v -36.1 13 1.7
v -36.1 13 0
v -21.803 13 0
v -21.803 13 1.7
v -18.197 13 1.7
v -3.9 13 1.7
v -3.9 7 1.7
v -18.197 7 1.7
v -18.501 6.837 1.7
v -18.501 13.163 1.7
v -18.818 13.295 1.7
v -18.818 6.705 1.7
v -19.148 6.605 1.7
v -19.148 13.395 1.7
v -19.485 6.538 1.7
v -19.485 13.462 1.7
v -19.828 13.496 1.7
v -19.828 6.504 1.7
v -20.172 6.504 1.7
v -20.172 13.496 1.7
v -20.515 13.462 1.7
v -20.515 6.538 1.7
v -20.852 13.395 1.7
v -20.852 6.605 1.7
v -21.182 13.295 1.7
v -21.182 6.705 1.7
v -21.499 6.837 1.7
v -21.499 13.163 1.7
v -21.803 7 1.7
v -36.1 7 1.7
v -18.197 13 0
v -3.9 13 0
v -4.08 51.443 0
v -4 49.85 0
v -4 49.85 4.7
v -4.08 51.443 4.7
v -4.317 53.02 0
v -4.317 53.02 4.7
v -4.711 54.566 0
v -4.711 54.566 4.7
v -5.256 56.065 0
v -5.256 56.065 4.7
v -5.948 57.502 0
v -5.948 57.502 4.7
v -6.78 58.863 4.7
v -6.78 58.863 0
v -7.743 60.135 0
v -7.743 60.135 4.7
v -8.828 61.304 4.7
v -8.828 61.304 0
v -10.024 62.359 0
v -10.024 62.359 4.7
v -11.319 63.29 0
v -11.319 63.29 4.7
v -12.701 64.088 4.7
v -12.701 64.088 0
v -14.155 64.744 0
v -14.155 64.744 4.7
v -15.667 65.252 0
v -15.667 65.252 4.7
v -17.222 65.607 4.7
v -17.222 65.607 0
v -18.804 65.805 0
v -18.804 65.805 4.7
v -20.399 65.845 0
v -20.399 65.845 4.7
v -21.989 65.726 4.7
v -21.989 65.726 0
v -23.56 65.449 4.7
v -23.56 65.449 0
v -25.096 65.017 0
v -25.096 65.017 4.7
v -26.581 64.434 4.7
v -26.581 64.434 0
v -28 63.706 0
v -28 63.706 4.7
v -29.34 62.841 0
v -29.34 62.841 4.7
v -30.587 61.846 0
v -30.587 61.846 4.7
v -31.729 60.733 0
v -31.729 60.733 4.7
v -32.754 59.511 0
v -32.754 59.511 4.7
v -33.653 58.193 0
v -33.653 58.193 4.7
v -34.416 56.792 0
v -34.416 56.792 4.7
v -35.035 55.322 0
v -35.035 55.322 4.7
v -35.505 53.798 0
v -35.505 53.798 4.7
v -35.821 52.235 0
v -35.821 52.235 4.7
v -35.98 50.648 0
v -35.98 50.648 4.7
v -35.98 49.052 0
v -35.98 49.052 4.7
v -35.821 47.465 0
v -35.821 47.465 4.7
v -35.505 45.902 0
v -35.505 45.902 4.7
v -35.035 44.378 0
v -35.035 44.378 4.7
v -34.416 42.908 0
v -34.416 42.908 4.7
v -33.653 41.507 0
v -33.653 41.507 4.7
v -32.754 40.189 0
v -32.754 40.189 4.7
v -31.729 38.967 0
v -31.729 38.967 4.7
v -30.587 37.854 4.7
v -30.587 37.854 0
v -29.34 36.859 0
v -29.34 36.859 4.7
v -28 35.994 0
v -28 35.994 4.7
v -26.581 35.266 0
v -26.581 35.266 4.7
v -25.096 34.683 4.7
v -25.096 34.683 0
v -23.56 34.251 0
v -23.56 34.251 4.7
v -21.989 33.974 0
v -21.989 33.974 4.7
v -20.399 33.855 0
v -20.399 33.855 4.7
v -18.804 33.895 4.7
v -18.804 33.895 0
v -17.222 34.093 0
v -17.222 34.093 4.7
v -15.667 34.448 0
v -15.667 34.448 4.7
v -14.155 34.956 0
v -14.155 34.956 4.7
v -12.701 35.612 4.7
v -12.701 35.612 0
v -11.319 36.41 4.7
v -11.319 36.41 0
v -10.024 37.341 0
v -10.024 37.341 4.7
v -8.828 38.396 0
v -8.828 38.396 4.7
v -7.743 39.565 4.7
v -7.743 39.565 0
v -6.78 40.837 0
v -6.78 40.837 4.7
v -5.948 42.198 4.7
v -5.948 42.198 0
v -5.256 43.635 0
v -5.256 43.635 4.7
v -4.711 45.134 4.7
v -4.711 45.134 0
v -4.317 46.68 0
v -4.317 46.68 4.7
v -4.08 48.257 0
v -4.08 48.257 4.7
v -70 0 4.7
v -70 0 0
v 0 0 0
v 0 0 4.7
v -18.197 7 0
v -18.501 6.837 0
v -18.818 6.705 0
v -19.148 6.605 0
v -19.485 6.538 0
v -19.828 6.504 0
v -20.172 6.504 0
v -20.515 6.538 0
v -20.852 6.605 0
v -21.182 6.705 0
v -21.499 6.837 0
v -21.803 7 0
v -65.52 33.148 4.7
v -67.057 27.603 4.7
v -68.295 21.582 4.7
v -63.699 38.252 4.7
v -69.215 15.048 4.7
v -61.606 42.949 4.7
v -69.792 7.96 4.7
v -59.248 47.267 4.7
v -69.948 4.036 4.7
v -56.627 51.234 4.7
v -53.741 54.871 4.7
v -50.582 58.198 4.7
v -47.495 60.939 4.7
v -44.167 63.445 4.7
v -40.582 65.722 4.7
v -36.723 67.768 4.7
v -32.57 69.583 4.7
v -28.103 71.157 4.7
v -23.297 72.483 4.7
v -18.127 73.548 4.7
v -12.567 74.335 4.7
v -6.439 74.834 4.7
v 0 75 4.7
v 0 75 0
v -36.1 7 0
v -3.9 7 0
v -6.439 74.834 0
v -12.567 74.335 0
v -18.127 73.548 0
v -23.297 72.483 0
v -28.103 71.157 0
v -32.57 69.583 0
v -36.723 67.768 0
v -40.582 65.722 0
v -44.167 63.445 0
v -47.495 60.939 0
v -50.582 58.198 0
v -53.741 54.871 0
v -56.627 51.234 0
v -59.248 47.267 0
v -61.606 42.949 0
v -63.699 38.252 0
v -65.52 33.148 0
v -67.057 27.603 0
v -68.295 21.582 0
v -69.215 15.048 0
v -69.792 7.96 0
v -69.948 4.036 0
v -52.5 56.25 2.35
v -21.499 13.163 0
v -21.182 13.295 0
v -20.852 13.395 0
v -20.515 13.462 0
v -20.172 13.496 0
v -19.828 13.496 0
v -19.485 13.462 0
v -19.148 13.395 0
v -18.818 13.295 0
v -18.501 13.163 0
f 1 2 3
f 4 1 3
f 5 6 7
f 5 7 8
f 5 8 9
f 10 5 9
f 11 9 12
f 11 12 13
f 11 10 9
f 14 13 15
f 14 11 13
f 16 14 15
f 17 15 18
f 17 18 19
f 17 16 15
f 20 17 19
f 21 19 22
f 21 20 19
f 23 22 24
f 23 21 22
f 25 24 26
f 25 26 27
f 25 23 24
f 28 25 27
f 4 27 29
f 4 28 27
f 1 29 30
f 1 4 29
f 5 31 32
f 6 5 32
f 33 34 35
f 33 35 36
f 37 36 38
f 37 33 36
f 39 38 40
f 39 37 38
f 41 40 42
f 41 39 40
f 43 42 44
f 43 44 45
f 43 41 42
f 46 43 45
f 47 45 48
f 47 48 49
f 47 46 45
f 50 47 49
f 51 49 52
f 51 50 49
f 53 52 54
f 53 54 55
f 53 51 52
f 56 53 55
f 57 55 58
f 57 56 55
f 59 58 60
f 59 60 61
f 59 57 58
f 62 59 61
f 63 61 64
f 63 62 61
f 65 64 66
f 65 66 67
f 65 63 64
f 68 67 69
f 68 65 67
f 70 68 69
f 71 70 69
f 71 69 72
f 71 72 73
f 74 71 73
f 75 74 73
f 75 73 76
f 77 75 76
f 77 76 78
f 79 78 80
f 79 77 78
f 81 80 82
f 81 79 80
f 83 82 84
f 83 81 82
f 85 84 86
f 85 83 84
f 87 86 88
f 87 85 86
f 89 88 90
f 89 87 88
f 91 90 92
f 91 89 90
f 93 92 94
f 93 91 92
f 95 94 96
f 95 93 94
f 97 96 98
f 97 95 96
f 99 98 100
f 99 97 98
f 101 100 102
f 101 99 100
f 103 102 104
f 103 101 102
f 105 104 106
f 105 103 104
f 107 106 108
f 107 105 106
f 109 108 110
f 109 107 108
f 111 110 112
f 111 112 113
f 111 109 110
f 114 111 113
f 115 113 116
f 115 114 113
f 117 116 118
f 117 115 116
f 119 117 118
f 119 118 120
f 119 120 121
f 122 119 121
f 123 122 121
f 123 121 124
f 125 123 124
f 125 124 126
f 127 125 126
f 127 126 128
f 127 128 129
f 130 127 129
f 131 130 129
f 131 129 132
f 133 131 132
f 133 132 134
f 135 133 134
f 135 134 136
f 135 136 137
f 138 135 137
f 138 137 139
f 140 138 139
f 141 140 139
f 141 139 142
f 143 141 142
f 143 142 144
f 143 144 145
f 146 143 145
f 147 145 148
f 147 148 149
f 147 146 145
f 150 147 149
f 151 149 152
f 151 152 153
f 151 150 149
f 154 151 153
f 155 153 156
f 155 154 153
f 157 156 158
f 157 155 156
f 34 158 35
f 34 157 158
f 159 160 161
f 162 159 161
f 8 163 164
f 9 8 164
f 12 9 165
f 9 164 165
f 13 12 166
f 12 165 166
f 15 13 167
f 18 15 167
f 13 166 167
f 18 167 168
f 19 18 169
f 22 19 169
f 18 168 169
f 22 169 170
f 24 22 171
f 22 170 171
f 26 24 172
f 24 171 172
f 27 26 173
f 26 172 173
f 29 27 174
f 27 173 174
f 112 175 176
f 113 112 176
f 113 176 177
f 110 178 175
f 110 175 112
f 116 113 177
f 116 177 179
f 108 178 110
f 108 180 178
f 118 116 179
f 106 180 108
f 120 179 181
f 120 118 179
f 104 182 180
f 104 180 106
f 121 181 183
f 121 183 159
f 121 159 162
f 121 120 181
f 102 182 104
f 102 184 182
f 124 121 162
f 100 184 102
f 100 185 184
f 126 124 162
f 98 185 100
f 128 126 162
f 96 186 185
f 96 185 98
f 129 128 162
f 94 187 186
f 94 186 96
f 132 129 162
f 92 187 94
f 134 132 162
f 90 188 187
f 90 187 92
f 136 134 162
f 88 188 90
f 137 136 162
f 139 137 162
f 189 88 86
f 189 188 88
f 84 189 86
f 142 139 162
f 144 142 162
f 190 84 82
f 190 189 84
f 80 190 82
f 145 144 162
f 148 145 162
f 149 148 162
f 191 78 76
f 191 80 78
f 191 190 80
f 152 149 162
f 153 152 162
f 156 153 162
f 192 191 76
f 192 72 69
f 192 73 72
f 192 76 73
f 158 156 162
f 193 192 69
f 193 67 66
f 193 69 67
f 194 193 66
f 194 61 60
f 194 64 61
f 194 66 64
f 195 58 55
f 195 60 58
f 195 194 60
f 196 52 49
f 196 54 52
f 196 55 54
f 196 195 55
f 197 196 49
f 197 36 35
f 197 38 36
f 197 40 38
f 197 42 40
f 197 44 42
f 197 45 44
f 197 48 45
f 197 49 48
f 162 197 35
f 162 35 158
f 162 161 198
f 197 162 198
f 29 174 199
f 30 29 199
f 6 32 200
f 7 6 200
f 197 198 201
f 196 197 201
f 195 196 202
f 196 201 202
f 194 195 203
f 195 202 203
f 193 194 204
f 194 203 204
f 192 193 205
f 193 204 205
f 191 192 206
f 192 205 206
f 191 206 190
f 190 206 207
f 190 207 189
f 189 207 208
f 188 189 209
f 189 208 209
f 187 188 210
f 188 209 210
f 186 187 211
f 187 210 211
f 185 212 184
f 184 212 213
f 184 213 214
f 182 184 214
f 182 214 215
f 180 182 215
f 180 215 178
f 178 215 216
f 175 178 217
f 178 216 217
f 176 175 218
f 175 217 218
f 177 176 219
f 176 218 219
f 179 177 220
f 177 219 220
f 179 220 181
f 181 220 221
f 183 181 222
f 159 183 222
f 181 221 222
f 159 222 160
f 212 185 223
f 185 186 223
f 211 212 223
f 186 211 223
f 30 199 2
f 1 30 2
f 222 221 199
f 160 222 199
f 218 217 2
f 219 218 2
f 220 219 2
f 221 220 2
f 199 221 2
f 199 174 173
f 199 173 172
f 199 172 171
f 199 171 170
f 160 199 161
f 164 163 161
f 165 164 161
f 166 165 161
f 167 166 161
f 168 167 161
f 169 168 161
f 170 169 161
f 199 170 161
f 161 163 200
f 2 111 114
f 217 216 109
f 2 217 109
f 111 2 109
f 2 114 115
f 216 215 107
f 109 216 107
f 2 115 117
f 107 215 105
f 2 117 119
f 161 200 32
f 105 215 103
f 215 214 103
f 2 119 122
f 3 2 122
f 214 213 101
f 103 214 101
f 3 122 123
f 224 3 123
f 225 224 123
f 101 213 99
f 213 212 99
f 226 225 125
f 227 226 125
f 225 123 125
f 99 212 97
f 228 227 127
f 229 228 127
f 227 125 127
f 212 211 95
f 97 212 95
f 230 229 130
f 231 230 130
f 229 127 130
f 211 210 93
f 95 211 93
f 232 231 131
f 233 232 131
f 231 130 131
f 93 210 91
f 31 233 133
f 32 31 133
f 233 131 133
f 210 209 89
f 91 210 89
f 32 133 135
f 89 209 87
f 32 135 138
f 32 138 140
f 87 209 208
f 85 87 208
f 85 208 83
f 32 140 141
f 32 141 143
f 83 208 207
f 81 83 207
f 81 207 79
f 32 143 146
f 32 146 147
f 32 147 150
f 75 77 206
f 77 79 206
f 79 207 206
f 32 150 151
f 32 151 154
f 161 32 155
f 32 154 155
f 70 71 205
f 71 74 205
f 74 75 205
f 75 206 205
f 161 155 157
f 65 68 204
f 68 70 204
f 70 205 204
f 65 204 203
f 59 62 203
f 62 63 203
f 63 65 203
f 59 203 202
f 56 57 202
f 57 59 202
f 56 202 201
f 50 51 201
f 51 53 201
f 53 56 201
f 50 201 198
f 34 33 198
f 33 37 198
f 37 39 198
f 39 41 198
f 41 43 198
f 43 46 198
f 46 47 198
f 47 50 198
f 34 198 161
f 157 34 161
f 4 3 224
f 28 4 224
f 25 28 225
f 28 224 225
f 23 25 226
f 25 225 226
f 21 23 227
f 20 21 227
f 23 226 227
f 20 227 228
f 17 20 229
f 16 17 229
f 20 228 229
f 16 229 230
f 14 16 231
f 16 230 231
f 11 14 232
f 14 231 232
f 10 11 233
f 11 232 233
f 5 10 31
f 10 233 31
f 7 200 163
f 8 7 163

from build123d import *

# Parameters (mm, degrees)
SKETCH1_R           = 16
BOSS_EXTRUDE1_DEPTH = 4.7
CUT_EXTRUDE1_DEPTH  = 1.7


with BuildPart() as part:
    # Sketch1 → Boss-Extrude1 (new body)
    with BuildSketch(Plane.XY):
        with BuildLine():
            Line((-70, 0), (0, 0))
            Line((0, 0), (0, 75))
            add(Edge.make_bspline(
                [(0, 75), (-70, 75), (-70, 0)],
                knots=[0, 0, 0, 1, 1, 1], degree=2))
        make_face()
        with Locations((-20, 49.85)):
            Circle(SKETCH1_R, mode=Mode.SUBTRACT)
    extrude(amount=BOSS_EXTRUDE1_DEPTH)

    # Sketch1<5> → Cut-Extrude1 (cut)
    with BuildSketch(Plane.XY):
        with BuildLine():
            Line((-3.9, 13), (-18.197224362, 13))
            ThreePointArc((-18.197224362, 13), (-20, 13.5), (-21.802775638, 13))
            Line((-21.802775638, 13), (-36.1, 13))
            Line((-36.1, 13), (-36.1, 7))
            Line((-36.1, 7), (-21.802775638, 7))
            ThreePointArc((-21.802775638, 7), (-20, 6.5), (-18.197224362, 7))
            Line((-18.197224362, 7), (-3.9, 7))
            Line((-3.9, 7), (-3.9, 13))
        make_face()
    extrude(amount=CUT_EXTRUDE1_DEPTH, mode=Mode.SUBTRACT)


solid = part.part
